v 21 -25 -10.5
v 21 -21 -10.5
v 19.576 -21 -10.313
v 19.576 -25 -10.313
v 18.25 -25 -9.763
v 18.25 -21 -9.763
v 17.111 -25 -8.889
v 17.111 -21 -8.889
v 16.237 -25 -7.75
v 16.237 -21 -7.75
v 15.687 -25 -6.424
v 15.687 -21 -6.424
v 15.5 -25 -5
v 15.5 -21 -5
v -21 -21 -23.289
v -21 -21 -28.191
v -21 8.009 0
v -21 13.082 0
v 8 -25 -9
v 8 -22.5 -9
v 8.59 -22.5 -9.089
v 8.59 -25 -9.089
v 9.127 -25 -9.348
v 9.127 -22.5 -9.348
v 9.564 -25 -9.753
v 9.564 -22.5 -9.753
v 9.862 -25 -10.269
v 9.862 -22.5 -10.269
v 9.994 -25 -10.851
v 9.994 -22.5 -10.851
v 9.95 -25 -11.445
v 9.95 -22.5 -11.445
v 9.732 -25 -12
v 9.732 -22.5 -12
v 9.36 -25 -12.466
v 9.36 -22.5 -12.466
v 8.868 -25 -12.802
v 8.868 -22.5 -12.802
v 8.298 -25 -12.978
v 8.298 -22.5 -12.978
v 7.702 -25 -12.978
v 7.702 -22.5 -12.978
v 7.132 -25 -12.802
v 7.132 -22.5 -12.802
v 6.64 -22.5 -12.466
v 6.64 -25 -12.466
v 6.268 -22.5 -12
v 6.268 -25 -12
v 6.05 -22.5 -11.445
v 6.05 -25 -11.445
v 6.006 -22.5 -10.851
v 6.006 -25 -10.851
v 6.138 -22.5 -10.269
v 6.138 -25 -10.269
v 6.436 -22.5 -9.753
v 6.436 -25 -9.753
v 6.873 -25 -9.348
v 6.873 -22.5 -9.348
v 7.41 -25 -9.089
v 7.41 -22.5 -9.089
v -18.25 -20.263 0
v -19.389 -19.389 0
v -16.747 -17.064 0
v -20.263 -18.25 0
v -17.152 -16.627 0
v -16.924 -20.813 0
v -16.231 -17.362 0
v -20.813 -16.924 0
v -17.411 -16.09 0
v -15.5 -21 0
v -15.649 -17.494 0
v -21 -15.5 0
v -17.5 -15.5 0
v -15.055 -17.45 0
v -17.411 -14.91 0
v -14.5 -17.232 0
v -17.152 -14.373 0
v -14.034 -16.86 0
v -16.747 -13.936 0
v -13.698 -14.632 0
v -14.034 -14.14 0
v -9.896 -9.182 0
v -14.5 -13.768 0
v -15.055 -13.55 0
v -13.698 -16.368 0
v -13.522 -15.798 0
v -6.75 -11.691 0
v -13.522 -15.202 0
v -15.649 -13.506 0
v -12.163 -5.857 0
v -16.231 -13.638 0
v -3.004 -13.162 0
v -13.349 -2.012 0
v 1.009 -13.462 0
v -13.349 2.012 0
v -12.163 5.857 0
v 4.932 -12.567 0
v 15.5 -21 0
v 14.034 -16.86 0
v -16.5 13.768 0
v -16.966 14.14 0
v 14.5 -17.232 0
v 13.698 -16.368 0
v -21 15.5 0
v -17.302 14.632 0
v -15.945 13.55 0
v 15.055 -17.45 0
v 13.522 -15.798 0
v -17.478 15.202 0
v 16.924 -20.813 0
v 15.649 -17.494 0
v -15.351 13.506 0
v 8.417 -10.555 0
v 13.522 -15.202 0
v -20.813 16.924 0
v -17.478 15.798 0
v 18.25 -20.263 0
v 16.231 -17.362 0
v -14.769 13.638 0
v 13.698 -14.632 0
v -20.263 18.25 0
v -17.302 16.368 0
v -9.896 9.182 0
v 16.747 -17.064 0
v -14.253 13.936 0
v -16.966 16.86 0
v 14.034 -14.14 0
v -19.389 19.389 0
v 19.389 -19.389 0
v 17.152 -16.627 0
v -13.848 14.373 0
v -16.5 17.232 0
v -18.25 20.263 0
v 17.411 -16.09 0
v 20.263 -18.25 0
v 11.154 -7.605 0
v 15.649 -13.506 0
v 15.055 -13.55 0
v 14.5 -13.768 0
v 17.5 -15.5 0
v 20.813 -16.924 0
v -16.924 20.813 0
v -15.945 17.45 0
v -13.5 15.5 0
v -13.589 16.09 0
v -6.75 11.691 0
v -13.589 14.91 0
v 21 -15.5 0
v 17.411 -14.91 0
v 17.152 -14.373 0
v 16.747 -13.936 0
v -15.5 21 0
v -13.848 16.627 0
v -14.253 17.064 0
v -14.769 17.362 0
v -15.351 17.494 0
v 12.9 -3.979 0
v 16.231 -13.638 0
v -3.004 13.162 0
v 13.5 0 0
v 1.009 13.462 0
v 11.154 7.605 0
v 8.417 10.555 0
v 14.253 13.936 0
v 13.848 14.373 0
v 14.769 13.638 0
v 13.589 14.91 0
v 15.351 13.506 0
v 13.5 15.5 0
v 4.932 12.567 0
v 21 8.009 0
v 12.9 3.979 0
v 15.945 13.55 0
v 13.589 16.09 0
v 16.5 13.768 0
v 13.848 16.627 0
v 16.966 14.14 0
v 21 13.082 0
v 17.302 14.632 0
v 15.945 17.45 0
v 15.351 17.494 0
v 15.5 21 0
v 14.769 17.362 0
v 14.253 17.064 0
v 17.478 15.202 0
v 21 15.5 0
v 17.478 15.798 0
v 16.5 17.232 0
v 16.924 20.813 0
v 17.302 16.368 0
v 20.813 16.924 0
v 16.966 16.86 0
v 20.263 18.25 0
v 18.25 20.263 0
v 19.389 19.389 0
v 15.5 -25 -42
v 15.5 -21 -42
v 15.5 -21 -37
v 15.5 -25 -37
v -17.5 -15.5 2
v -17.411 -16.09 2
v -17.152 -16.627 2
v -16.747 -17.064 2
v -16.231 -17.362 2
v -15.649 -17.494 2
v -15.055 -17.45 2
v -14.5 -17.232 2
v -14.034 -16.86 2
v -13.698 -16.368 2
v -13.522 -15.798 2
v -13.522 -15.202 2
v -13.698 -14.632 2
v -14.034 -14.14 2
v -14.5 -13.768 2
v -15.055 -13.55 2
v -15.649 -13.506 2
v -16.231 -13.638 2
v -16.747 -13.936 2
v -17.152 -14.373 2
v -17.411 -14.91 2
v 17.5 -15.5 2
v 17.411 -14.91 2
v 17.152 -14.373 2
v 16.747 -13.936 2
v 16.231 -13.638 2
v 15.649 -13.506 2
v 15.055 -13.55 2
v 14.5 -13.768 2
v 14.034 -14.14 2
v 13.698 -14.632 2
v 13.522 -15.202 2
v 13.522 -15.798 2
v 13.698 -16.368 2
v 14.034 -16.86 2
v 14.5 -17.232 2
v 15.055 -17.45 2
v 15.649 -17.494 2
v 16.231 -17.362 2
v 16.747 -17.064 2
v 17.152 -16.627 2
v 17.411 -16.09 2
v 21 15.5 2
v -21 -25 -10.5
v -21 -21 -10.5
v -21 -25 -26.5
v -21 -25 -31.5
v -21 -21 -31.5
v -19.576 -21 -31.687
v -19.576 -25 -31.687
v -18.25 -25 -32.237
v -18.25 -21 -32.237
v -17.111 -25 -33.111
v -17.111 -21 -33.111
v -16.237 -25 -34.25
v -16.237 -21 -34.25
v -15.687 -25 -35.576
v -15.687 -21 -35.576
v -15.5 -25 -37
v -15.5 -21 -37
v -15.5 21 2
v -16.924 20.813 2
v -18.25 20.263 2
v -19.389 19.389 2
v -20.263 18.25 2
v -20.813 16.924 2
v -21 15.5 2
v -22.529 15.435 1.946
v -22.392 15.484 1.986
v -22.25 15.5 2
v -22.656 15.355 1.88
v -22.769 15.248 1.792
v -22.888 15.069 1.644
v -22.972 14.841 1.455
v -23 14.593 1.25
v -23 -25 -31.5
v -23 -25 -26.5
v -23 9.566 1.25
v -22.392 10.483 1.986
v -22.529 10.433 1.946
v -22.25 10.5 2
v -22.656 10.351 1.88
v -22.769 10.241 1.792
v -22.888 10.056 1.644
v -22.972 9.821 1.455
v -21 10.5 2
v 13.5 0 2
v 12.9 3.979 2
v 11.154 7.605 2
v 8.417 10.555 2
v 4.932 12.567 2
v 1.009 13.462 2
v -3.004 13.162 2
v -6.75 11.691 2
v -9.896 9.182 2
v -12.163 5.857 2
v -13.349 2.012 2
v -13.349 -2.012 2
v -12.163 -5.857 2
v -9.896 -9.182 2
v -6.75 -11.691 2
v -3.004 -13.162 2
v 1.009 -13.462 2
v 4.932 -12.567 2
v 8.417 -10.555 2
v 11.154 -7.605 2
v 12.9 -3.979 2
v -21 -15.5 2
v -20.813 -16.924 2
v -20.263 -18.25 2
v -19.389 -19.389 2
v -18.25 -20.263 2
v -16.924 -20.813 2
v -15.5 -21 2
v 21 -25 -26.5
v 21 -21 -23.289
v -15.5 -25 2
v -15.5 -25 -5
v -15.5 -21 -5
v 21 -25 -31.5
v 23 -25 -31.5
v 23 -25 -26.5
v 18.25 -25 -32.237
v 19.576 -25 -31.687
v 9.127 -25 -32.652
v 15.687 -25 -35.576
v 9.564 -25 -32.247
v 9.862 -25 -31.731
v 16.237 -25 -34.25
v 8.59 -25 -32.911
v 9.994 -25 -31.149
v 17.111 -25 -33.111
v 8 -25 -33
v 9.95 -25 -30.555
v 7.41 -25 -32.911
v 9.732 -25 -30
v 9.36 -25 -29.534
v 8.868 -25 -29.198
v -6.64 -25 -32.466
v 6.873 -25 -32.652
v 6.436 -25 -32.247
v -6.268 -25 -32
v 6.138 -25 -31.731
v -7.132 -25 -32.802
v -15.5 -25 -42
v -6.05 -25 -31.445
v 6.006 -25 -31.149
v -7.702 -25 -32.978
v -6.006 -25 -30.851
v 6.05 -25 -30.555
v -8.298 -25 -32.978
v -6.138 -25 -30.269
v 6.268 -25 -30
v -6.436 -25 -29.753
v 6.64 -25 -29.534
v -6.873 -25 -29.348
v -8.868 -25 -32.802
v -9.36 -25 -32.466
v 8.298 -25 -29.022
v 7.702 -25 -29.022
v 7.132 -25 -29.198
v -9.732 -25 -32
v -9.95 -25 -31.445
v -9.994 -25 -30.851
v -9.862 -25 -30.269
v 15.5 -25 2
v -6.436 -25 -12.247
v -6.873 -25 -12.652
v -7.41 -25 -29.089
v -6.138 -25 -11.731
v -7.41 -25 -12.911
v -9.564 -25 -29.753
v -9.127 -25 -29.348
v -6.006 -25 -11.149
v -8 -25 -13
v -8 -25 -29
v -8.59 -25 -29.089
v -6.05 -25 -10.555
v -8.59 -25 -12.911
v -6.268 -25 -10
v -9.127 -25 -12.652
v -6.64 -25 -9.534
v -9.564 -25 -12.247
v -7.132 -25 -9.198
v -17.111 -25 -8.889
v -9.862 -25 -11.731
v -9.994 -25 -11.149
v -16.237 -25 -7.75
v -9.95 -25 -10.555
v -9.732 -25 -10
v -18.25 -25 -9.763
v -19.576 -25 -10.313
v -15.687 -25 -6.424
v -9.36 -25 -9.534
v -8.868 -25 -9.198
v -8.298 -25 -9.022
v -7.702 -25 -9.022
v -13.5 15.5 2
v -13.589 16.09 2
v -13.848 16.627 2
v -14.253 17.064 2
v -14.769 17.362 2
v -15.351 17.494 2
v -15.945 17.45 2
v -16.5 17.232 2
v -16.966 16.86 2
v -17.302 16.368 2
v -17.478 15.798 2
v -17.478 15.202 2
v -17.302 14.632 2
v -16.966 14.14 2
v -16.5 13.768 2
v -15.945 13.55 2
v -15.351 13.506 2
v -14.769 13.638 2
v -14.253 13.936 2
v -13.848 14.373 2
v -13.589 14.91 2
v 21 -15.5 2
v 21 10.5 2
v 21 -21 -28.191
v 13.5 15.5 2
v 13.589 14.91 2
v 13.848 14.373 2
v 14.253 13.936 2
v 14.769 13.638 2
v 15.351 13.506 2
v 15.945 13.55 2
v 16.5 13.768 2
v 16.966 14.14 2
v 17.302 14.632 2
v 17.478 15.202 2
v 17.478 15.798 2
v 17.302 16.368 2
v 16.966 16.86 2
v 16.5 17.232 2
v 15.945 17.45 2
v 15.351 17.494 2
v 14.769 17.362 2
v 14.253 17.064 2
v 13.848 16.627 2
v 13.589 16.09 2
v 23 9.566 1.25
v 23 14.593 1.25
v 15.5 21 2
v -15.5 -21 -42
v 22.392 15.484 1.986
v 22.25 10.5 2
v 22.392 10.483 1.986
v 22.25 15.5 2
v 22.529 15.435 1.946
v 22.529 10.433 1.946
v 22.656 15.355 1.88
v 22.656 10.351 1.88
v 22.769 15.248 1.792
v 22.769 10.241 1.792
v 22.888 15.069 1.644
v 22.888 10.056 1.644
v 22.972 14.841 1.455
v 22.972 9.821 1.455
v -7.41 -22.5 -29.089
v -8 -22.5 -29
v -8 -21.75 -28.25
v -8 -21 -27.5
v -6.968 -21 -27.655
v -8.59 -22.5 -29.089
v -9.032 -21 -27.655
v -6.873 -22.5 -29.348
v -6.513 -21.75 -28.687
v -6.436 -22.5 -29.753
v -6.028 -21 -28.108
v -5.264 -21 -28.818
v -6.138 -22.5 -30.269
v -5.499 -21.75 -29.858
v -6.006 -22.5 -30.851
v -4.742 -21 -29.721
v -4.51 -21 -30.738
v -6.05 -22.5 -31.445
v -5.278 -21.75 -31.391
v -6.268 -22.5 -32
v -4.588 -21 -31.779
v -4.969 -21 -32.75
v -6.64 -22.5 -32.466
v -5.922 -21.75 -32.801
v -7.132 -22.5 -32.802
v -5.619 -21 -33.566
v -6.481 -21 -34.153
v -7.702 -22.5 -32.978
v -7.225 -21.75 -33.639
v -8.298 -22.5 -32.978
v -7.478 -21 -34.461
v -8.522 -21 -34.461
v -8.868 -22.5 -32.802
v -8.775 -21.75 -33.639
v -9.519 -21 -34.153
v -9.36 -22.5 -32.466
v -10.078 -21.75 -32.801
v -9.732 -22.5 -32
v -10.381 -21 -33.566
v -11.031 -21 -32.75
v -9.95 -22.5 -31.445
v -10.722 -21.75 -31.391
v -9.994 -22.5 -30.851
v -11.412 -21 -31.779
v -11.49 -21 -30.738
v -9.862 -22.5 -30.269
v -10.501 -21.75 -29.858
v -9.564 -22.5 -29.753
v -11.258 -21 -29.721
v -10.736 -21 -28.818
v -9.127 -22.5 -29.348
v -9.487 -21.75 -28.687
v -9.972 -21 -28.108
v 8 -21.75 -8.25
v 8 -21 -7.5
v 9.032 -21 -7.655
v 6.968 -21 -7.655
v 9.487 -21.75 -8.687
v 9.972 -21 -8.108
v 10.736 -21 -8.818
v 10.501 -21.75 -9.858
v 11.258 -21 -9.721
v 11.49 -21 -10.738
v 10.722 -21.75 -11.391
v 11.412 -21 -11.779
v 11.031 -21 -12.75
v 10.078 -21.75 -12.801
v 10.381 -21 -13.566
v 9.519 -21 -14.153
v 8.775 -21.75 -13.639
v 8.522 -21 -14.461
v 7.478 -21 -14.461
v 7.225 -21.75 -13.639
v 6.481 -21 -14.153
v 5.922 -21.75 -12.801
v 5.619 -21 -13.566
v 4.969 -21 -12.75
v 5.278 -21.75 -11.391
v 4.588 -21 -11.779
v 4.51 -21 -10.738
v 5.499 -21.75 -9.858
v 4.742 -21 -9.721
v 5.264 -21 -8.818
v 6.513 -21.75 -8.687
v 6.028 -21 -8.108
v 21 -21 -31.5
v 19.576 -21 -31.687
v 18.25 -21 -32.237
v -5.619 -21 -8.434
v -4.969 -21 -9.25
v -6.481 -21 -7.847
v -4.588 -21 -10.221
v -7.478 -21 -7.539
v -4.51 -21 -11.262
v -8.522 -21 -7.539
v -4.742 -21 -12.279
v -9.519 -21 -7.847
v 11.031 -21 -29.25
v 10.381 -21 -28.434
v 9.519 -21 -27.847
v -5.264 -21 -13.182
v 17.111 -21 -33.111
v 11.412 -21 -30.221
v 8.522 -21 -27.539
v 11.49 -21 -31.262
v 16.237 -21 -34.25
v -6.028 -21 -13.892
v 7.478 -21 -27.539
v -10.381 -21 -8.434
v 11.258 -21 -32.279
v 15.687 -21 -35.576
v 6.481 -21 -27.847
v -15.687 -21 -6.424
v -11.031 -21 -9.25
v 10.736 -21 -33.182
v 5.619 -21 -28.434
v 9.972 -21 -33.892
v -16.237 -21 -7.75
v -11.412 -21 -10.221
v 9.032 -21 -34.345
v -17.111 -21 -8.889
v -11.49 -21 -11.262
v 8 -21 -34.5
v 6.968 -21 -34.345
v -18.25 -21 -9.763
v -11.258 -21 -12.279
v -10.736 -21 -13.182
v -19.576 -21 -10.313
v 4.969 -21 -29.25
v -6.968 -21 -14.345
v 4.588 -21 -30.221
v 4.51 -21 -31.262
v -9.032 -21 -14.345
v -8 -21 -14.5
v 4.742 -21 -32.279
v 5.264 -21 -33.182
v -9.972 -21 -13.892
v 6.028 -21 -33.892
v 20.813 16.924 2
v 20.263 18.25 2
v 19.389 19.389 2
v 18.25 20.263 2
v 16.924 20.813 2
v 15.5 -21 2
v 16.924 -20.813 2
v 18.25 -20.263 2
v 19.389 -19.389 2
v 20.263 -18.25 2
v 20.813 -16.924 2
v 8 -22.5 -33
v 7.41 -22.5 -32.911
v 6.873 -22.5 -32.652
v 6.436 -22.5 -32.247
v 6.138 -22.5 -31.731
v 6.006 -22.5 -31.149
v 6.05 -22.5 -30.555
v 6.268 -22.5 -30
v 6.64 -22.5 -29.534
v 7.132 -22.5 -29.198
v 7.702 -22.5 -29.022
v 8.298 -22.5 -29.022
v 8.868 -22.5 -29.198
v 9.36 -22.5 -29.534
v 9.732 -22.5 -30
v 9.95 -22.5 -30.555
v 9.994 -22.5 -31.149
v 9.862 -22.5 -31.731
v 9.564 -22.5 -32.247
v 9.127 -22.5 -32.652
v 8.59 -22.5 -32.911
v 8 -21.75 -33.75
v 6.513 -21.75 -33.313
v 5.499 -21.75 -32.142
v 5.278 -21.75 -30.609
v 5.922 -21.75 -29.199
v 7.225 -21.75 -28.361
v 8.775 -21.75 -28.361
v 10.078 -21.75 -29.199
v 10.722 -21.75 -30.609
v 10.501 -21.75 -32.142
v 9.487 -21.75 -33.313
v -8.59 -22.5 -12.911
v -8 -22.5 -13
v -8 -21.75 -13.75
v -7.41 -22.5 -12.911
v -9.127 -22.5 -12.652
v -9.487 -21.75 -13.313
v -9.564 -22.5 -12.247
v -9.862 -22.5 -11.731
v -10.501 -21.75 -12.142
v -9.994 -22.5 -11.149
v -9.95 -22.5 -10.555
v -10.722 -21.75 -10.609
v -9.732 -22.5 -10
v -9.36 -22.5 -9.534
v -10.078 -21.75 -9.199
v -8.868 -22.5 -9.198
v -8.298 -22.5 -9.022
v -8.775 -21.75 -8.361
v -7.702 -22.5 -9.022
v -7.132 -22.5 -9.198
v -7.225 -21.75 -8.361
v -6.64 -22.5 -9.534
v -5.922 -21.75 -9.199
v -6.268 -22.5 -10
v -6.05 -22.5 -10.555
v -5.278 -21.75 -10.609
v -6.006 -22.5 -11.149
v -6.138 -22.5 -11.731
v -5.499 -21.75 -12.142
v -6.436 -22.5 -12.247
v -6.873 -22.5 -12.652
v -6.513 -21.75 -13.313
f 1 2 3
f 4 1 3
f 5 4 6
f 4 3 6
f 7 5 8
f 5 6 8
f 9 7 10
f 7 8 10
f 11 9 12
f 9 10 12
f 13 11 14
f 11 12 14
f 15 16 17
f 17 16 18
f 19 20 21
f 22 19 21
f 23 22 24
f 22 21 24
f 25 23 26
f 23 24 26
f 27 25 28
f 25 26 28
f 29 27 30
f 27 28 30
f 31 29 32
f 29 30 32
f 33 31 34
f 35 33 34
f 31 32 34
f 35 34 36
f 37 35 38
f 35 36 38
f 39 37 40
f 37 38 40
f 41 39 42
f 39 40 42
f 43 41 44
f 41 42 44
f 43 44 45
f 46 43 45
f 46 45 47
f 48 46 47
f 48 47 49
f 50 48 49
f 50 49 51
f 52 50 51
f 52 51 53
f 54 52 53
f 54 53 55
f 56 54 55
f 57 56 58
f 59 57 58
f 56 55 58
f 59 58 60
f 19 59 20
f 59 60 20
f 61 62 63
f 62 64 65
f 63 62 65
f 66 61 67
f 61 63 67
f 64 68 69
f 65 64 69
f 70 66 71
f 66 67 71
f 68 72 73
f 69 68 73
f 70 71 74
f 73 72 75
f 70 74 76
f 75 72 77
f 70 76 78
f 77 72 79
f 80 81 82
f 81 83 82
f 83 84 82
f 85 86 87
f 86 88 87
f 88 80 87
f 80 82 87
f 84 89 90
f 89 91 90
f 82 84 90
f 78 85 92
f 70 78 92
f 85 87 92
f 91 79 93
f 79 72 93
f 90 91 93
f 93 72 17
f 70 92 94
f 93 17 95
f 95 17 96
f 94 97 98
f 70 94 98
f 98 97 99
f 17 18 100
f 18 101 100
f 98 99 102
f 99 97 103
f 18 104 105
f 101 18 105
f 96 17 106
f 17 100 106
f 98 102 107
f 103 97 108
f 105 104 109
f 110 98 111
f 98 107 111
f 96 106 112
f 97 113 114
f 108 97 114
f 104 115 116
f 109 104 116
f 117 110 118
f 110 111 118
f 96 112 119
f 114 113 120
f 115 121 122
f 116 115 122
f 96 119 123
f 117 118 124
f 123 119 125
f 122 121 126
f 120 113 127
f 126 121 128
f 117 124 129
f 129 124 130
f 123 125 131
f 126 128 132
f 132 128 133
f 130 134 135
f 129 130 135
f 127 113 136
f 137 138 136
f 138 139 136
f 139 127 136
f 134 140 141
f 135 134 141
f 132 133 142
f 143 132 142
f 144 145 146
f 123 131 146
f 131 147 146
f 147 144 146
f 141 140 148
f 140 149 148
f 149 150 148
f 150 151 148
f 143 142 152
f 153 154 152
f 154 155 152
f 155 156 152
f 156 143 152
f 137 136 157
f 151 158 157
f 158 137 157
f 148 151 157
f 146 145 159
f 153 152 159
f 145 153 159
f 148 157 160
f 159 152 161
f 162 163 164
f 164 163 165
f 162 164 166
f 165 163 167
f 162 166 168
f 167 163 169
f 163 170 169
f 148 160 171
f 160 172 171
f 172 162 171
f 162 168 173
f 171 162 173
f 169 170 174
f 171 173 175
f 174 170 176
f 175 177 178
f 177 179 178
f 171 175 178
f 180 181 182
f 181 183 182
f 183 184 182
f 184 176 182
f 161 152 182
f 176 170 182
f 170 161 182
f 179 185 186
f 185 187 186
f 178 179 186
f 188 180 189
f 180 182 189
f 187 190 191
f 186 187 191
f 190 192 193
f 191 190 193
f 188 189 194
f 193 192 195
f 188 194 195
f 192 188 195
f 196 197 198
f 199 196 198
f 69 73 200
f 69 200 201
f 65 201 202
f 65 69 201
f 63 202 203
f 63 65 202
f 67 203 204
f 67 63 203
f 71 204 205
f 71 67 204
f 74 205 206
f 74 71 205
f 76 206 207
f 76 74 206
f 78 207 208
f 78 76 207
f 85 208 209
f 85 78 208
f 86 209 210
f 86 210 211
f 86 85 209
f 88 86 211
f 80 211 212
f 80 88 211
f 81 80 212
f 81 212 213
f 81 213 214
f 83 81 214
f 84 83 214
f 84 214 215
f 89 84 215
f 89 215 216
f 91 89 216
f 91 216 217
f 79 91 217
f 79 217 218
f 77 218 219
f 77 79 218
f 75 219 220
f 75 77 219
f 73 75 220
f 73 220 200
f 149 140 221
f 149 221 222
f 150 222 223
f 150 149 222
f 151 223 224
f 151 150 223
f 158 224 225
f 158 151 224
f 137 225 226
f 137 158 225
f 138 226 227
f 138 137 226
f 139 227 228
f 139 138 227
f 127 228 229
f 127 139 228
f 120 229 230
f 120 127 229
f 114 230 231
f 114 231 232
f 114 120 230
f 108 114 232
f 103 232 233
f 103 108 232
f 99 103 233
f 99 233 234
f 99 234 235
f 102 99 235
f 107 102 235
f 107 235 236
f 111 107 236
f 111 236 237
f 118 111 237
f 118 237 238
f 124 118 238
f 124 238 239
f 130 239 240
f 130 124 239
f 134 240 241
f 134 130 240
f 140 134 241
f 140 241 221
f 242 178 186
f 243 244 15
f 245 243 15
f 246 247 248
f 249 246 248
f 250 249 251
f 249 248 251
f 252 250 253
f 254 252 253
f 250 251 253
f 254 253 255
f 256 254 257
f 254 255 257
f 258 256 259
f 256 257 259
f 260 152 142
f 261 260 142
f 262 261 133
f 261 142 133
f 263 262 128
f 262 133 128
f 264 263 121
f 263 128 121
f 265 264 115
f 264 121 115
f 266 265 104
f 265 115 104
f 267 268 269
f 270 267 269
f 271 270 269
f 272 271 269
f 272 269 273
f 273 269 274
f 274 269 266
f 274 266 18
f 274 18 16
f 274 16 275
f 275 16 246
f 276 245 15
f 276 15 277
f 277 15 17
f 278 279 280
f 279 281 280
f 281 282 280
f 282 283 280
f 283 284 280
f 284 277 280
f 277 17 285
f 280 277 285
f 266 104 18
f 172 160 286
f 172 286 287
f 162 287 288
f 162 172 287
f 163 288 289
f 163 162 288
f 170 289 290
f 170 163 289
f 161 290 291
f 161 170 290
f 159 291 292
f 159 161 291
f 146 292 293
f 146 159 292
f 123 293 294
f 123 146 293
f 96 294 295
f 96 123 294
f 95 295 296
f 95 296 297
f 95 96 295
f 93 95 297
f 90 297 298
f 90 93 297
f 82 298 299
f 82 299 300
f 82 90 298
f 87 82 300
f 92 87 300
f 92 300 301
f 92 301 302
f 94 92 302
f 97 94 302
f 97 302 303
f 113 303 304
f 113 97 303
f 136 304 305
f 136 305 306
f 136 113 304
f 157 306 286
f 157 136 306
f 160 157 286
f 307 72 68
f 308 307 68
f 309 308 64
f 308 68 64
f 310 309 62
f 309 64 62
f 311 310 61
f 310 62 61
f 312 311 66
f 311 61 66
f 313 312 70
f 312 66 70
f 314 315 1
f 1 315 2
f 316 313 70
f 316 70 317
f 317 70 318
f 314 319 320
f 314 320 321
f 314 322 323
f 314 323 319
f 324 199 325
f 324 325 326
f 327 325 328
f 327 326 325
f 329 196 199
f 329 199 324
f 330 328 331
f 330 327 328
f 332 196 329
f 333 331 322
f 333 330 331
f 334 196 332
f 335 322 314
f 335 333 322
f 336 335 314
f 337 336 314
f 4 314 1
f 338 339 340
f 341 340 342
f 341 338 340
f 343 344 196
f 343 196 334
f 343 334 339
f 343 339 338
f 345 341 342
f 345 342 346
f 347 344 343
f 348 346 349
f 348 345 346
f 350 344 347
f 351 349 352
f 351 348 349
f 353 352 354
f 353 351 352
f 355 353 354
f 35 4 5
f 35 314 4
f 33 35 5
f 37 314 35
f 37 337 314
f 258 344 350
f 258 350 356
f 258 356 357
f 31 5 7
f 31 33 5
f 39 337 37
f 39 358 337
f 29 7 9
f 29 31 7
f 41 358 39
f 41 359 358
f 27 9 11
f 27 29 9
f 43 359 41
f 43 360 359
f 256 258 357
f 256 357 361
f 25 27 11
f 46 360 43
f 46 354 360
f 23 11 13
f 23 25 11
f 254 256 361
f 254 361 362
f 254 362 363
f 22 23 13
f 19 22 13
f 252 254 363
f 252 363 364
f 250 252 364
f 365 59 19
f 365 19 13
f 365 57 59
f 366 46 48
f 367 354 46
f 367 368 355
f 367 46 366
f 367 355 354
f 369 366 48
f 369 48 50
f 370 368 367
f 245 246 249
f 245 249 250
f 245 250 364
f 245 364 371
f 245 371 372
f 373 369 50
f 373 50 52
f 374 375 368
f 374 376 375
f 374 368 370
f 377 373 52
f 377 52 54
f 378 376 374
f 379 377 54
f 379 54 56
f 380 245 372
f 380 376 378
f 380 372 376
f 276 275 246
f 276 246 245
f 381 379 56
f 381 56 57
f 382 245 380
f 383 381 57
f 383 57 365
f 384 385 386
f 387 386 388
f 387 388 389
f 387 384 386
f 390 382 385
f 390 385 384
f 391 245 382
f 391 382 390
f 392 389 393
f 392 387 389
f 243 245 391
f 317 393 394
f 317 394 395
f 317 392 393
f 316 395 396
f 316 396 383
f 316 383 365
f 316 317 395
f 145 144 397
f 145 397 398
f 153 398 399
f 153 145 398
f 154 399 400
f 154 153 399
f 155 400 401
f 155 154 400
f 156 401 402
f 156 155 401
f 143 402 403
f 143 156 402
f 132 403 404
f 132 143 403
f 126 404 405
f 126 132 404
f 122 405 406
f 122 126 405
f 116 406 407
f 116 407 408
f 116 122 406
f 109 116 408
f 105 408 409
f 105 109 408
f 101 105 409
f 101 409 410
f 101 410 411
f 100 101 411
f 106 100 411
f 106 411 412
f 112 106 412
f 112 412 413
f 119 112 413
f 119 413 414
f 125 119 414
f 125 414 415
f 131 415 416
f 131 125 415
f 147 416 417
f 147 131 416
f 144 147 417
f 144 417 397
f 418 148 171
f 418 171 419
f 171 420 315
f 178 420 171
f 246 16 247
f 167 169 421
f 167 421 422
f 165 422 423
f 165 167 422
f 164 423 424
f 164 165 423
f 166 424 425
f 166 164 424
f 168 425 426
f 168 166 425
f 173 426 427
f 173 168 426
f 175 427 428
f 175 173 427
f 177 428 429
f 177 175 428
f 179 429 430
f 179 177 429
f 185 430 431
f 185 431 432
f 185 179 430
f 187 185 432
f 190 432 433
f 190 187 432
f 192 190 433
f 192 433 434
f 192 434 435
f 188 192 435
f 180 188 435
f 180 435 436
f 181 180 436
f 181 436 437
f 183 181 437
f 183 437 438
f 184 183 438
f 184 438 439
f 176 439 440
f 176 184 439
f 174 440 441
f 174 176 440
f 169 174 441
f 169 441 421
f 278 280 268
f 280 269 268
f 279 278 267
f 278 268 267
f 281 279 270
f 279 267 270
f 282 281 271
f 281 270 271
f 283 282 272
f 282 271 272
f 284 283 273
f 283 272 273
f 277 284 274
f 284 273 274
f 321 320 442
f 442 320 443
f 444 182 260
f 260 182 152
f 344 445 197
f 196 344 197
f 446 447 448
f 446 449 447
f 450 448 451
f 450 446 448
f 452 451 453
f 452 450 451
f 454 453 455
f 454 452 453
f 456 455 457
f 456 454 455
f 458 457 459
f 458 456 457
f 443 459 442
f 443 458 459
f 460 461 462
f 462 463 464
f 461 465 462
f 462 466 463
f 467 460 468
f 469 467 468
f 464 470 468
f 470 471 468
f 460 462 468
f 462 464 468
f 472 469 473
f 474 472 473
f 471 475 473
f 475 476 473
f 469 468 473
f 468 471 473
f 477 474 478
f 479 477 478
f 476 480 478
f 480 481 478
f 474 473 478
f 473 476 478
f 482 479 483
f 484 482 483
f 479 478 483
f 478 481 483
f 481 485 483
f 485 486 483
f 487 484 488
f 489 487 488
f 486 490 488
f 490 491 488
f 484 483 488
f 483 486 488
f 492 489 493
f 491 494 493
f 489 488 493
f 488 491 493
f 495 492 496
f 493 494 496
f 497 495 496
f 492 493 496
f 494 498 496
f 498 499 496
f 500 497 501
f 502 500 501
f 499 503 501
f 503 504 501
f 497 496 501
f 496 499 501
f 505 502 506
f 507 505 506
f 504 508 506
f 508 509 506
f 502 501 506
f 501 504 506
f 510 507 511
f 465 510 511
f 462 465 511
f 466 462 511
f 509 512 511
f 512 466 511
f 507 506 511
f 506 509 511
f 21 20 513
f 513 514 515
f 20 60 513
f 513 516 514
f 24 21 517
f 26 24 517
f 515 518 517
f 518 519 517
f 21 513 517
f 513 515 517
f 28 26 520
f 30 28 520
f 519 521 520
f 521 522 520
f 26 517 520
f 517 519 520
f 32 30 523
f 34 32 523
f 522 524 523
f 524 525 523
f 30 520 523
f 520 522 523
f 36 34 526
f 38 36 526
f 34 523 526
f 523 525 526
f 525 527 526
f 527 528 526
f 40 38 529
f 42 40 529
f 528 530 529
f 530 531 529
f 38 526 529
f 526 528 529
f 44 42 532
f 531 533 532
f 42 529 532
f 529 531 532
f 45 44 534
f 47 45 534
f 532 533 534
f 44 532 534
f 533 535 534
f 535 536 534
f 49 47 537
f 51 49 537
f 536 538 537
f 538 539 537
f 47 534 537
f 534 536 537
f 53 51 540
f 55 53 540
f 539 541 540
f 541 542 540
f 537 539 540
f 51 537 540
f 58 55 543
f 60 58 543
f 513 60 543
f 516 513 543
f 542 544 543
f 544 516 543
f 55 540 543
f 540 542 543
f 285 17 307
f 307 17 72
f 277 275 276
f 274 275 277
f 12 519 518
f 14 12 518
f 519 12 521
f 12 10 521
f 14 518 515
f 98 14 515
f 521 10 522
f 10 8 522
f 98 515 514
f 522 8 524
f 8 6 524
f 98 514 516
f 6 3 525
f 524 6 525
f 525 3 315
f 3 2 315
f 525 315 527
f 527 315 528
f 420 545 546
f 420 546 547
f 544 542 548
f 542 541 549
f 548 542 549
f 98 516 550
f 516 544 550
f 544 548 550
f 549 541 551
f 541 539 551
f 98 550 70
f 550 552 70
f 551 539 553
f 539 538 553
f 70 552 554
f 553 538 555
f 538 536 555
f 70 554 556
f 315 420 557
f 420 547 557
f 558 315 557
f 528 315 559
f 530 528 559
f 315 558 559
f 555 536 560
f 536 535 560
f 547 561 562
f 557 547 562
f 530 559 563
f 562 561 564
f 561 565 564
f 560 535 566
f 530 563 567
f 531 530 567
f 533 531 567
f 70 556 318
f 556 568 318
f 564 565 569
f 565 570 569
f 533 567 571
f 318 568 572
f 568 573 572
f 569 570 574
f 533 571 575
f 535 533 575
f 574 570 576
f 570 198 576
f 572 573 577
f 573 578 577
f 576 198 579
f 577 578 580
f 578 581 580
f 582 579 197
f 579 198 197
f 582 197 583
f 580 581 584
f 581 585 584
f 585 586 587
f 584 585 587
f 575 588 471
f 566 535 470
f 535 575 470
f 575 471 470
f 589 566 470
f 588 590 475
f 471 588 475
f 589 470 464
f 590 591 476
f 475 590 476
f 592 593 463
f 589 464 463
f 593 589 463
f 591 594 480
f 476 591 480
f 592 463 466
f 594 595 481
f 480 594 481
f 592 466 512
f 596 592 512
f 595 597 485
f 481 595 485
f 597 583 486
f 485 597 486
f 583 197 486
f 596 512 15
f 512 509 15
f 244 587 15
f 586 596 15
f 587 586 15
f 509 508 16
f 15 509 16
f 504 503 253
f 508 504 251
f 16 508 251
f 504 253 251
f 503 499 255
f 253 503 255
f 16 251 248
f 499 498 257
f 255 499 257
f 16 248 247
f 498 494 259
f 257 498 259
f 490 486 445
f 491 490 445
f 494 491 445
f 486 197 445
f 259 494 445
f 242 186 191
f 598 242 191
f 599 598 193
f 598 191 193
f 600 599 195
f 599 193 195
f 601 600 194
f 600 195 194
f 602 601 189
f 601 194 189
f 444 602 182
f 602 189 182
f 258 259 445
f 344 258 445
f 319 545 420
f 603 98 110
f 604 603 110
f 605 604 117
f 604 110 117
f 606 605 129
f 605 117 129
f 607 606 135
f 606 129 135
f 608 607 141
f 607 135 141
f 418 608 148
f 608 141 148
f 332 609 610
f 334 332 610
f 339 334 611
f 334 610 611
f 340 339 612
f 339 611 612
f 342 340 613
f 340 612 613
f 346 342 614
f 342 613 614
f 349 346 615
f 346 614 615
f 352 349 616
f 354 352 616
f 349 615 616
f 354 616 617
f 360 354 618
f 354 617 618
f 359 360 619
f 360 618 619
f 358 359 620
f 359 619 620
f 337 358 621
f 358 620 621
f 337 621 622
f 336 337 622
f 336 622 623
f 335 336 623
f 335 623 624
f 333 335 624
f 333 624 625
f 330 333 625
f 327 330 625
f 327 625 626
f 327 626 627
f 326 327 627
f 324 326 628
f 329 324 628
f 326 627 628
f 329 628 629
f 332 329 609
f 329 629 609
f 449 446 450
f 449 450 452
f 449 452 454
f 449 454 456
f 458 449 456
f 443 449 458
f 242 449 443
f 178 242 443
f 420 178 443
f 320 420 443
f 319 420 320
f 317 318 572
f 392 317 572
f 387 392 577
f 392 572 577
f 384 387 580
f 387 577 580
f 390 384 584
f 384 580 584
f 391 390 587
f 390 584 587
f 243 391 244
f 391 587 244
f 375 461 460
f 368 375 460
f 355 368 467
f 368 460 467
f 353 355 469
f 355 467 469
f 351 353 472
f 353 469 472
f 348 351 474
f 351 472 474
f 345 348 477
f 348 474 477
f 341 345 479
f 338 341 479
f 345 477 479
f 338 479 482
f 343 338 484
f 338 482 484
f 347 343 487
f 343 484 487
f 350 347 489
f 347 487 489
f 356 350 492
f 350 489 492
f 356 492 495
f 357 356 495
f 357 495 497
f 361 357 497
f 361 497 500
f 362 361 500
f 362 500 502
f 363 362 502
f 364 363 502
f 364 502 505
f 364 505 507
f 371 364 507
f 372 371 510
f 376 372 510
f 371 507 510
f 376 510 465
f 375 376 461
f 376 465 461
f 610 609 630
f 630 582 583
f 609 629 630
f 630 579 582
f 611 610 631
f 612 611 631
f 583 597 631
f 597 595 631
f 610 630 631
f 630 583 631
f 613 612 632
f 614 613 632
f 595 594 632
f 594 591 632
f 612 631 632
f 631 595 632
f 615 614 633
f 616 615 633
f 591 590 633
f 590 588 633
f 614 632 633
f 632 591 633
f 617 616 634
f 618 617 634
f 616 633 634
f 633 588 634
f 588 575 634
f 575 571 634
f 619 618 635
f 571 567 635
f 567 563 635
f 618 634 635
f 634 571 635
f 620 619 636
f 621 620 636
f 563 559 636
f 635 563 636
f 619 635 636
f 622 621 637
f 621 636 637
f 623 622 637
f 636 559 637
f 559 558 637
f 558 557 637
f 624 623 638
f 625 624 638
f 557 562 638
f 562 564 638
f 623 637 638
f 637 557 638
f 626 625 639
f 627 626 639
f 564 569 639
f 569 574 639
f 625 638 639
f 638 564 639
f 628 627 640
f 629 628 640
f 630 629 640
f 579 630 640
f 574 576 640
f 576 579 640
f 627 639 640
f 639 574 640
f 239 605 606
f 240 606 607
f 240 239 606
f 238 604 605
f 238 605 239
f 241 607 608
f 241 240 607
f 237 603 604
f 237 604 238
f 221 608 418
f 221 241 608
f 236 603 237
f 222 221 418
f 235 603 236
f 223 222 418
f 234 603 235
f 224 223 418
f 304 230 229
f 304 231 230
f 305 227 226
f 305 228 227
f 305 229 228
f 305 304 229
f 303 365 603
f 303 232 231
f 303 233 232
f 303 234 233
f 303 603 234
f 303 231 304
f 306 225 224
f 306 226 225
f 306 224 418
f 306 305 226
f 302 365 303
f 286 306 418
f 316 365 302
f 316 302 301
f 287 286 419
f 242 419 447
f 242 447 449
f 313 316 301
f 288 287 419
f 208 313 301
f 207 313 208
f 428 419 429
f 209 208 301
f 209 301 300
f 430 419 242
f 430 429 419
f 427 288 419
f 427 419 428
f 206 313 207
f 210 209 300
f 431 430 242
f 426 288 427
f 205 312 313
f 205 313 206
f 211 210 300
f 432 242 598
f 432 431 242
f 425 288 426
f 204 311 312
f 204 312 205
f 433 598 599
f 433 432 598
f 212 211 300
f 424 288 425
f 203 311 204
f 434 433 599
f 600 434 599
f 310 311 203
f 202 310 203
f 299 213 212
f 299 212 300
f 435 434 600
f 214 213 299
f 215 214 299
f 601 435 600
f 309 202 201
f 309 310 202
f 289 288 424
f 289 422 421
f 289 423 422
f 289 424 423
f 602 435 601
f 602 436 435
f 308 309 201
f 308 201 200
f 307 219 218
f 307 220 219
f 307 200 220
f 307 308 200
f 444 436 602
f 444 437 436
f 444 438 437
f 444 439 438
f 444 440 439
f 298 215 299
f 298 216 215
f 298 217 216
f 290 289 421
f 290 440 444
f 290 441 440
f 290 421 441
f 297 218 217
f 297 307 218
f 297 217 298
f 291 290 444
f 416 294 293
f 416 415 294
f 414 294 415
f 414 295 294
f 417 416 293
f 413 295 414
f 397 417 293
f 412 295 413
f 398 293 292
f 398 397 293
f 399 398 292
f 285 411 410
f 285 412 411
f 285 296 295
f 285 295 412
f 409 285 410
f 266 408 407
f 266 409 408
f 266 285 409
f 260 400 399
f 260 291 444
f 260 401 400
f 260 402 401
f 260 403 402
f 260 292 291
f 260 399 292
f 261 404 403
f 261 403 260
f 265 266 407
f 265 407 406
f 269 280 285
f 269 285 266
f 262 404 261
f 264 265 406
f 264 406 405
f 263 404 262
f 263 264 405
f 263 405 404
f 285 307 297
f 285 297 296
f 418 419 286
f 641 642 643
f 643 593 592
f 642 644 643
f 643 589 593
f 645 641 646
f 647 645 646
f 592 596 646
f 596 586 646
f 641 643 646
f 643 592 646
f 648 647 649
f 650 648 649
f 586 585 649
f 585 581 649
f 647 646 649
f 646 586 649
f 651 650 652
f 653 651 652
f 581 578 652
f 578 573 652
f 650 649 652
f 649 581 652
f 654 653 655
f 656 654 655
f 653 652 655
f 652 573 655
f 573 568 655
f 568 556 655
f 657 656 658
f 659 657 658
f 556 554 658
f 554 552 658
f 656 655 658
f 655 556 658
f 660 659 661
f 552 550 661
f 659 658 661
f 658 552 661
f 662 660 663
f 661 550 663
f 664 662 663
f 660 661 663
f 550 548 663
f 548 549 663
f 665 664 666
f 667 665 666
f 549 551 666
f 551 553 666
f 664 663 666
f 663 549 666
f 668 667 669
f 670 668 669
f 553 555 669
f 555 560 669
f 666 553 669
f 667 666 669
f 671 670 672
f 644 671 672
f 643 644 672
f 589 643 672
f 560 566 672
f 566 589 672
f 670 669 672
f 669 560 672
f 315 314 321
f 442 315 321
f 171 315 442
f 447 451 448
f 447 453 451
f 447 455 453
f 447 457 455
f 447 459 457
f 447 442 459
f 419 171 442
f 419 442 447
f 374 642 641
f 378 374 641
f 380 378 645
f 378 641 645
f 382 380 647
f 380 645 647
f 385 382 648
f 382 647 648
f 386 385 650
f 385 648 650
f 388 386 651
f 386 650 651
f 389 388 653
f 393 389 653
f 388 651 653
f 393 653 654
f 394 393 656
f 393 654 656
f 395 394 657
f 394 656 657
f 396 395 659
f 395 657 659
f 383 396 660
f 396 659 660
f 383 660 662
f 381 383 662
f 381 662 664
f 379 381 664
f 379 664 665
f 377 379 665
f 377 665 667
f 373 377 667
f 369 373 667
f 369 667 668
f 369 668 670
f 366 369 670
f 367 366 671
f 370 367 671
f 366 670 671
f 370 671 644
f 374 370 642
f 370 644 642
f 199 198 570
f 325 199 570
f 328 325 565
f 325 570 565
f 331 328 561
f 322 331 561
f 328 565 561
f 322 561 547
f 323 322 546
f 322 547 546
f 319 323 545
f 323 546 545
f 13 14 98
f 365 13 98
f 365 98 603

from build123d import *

# Parameters (mm, degrees)
SKETCH1_R           = 2
SKETCH1_R_2         = 13.5
BOSS_EXTRUDE1_DEPTH = 2
SKETCH4_R           = 2
BOSS_EXTRUDE2_DEPTH = 4
CHAMFER1_SIZE       = 1.5
BOSS_EXTRUDE3_DEPTH = 2
FILLET2_R           = 0.75
FILLET4_R           = 0.75


with BuildPart() as part:
    # Sketch1 → Boss-Extrude1 (new body)
    with BuildSketch(Plane.XY):
        with BuildLine():
            Line((-15.5, -21), (15.5, -21))
            ThreePointArc((15.5, -21), (19.389087297, -19.389087297), (21, -15.5))
            Line((21, -15.5), (21, 15.5))
            ThreePointArc((21, 15.5), (19.389087297, 19.389087297), (15.5, 21))
            Line((15.5, 21), (-15.5, 21))
            ThreePointArc((-15.5, 21), (-19.389087297, 19.389087297), (-21, 15.5))
            Line((-21, 15.5), (-21, -15.5))
            ThreePointArc((-21, -15.5), (-19.389087297, -19.389087297), (-15.5, -21))
        make_face()
        with Locations((-15.5, 15.5)):
            Circle(SKETCH1_R, mode=Mode.SUBTRACT)
        with Locations(Location((-15.5, -15.5, 0), (0, 0, 180))):
            Circle(SKETCH1_R, mode=Mode.SUBTRACT)
        with Locations((15.5, -15.5)):
            Circle(SKETCH1_R, mode=Mode.SUBTRACT)
        with Locations(Location((15.5, 15.5, 0), (0, 0, 180))):
            Circle(SKETCH1_R, mode=Mode.SUBTRACT)
        Circle(SKETCH1_R_2, mode=Mode.SUBTRACT)
    extrude(amount=BOSS_EXTRUDE1_DEPTH)



with BuildPart() as body_2:
    # Sketch4 → Boss-Extrude2 (new body)
    with BuildSketch(Plane(origin=(0, -21, 0), x_dir=(1, 0, 0), z_dir=(0, 1, 0))):
        with BuildLine():
            Line((-15.5, 0), (-15.5, 5))
            ThreePointArc((-15.5, 5), (-17.110912703, 8.889087297), (-21, 10.5))
            Line((-21, 10.5), (-21, 31.5))
            ThreePointArc((-21, 31.5), (-17.110912703, 33.110912703), (-15.5, 37))
            Line((-15.5, 37), (-15.5, 42))
            Line((-15.5, 42), (15.5, 42))
            Line((15.5, 42), (15.5, 37))
            ThreePointArc((15.5, 37), (17.110912703, 33.110912703), (21, 31.5))
            Line((21, 31.5), (21, 10.5))
            ThreePointArc((21, 10.5), (17.110912703, 8.889087297), (15.5, 5))
            Line((15.5, 5), (15.5, 0))
            Line((15.5, 0), (15.5, -2))
            Line((15.5, -2), (-15.5, -2))
            Line((-15.5, -2), (-15.5, 0))
        make_face()
        with Locations(Location((-8, 31, 0), (0, 0, 270))):
            Circle(SKETCH4_R, mode=Mode.SUBTRACT)
        with Locations(Location((-8, 11, 0), (0, 0, 90))):
            Circle(SKETCH4_R, mode=Mode.SUBTRACT)
        with Locations(Location((8, 31, 0), (0, 0, 90))):
            Circle(SKETCH4_R, mode=Mode.SUBTRACT)
        with Locations(Location((8, 11, 0), (0, 0, 270))):
            Circle(SKETCH4_R, mode=Mode.SUBTRACT)
    extrude(amount=-BOSS_EXTRUDE2_DEPTH)

    # Chamfer1
    chamfer1_edges = [body_2.edges().sort_by_distance(p)[0] for p in [
        (-8, -21, -33),
        (-8, -21, -9),
        (8, -21, -29),
        (8, -21, -13),
    ]]
    chamfer(chamfer1_edges, length=CHAMFER1_SIZE)


with BuildPart() as part_1:
    add(part.part)

    add(body_2.part)  # Boss-Extrude3 merges body 2
    # Sketch5 → Boss-Extrude3 (add)
    with BuildSketch(Plane.ZY.offset(21)):
        Polygon((-26.5, -25), (2, 10.5), (2, 15.5), (-31.5, -25), align=None)
    boss_extrude3 = extrude(amount=BOSS_EXTRUDE3_DEPTH)

    # Mirror5: Boss-Extrude3 across plane
    add(boss_extrude3.mirror(Plane(origin=(0, 0, 0), x_dir=(0, 0, 1), z_dir=(1, 0, 0))))

    # Fillet2
    fillet2_edges = [part_1.edges().sort_by_distance(p)[0] for p in [
        (23, 13, 2),
    ]]
    fillet(fillet2_edges, radius=FILLET2_R)

    # Fillet4
    fillet4_edges = [part_1.edges().sort_by_distance(p)[0] for p in [
        (-23, 13, 2),
    ]]
    fillet(fillet4_edges, radius=FILLET4_R)


solid = part_1.part
